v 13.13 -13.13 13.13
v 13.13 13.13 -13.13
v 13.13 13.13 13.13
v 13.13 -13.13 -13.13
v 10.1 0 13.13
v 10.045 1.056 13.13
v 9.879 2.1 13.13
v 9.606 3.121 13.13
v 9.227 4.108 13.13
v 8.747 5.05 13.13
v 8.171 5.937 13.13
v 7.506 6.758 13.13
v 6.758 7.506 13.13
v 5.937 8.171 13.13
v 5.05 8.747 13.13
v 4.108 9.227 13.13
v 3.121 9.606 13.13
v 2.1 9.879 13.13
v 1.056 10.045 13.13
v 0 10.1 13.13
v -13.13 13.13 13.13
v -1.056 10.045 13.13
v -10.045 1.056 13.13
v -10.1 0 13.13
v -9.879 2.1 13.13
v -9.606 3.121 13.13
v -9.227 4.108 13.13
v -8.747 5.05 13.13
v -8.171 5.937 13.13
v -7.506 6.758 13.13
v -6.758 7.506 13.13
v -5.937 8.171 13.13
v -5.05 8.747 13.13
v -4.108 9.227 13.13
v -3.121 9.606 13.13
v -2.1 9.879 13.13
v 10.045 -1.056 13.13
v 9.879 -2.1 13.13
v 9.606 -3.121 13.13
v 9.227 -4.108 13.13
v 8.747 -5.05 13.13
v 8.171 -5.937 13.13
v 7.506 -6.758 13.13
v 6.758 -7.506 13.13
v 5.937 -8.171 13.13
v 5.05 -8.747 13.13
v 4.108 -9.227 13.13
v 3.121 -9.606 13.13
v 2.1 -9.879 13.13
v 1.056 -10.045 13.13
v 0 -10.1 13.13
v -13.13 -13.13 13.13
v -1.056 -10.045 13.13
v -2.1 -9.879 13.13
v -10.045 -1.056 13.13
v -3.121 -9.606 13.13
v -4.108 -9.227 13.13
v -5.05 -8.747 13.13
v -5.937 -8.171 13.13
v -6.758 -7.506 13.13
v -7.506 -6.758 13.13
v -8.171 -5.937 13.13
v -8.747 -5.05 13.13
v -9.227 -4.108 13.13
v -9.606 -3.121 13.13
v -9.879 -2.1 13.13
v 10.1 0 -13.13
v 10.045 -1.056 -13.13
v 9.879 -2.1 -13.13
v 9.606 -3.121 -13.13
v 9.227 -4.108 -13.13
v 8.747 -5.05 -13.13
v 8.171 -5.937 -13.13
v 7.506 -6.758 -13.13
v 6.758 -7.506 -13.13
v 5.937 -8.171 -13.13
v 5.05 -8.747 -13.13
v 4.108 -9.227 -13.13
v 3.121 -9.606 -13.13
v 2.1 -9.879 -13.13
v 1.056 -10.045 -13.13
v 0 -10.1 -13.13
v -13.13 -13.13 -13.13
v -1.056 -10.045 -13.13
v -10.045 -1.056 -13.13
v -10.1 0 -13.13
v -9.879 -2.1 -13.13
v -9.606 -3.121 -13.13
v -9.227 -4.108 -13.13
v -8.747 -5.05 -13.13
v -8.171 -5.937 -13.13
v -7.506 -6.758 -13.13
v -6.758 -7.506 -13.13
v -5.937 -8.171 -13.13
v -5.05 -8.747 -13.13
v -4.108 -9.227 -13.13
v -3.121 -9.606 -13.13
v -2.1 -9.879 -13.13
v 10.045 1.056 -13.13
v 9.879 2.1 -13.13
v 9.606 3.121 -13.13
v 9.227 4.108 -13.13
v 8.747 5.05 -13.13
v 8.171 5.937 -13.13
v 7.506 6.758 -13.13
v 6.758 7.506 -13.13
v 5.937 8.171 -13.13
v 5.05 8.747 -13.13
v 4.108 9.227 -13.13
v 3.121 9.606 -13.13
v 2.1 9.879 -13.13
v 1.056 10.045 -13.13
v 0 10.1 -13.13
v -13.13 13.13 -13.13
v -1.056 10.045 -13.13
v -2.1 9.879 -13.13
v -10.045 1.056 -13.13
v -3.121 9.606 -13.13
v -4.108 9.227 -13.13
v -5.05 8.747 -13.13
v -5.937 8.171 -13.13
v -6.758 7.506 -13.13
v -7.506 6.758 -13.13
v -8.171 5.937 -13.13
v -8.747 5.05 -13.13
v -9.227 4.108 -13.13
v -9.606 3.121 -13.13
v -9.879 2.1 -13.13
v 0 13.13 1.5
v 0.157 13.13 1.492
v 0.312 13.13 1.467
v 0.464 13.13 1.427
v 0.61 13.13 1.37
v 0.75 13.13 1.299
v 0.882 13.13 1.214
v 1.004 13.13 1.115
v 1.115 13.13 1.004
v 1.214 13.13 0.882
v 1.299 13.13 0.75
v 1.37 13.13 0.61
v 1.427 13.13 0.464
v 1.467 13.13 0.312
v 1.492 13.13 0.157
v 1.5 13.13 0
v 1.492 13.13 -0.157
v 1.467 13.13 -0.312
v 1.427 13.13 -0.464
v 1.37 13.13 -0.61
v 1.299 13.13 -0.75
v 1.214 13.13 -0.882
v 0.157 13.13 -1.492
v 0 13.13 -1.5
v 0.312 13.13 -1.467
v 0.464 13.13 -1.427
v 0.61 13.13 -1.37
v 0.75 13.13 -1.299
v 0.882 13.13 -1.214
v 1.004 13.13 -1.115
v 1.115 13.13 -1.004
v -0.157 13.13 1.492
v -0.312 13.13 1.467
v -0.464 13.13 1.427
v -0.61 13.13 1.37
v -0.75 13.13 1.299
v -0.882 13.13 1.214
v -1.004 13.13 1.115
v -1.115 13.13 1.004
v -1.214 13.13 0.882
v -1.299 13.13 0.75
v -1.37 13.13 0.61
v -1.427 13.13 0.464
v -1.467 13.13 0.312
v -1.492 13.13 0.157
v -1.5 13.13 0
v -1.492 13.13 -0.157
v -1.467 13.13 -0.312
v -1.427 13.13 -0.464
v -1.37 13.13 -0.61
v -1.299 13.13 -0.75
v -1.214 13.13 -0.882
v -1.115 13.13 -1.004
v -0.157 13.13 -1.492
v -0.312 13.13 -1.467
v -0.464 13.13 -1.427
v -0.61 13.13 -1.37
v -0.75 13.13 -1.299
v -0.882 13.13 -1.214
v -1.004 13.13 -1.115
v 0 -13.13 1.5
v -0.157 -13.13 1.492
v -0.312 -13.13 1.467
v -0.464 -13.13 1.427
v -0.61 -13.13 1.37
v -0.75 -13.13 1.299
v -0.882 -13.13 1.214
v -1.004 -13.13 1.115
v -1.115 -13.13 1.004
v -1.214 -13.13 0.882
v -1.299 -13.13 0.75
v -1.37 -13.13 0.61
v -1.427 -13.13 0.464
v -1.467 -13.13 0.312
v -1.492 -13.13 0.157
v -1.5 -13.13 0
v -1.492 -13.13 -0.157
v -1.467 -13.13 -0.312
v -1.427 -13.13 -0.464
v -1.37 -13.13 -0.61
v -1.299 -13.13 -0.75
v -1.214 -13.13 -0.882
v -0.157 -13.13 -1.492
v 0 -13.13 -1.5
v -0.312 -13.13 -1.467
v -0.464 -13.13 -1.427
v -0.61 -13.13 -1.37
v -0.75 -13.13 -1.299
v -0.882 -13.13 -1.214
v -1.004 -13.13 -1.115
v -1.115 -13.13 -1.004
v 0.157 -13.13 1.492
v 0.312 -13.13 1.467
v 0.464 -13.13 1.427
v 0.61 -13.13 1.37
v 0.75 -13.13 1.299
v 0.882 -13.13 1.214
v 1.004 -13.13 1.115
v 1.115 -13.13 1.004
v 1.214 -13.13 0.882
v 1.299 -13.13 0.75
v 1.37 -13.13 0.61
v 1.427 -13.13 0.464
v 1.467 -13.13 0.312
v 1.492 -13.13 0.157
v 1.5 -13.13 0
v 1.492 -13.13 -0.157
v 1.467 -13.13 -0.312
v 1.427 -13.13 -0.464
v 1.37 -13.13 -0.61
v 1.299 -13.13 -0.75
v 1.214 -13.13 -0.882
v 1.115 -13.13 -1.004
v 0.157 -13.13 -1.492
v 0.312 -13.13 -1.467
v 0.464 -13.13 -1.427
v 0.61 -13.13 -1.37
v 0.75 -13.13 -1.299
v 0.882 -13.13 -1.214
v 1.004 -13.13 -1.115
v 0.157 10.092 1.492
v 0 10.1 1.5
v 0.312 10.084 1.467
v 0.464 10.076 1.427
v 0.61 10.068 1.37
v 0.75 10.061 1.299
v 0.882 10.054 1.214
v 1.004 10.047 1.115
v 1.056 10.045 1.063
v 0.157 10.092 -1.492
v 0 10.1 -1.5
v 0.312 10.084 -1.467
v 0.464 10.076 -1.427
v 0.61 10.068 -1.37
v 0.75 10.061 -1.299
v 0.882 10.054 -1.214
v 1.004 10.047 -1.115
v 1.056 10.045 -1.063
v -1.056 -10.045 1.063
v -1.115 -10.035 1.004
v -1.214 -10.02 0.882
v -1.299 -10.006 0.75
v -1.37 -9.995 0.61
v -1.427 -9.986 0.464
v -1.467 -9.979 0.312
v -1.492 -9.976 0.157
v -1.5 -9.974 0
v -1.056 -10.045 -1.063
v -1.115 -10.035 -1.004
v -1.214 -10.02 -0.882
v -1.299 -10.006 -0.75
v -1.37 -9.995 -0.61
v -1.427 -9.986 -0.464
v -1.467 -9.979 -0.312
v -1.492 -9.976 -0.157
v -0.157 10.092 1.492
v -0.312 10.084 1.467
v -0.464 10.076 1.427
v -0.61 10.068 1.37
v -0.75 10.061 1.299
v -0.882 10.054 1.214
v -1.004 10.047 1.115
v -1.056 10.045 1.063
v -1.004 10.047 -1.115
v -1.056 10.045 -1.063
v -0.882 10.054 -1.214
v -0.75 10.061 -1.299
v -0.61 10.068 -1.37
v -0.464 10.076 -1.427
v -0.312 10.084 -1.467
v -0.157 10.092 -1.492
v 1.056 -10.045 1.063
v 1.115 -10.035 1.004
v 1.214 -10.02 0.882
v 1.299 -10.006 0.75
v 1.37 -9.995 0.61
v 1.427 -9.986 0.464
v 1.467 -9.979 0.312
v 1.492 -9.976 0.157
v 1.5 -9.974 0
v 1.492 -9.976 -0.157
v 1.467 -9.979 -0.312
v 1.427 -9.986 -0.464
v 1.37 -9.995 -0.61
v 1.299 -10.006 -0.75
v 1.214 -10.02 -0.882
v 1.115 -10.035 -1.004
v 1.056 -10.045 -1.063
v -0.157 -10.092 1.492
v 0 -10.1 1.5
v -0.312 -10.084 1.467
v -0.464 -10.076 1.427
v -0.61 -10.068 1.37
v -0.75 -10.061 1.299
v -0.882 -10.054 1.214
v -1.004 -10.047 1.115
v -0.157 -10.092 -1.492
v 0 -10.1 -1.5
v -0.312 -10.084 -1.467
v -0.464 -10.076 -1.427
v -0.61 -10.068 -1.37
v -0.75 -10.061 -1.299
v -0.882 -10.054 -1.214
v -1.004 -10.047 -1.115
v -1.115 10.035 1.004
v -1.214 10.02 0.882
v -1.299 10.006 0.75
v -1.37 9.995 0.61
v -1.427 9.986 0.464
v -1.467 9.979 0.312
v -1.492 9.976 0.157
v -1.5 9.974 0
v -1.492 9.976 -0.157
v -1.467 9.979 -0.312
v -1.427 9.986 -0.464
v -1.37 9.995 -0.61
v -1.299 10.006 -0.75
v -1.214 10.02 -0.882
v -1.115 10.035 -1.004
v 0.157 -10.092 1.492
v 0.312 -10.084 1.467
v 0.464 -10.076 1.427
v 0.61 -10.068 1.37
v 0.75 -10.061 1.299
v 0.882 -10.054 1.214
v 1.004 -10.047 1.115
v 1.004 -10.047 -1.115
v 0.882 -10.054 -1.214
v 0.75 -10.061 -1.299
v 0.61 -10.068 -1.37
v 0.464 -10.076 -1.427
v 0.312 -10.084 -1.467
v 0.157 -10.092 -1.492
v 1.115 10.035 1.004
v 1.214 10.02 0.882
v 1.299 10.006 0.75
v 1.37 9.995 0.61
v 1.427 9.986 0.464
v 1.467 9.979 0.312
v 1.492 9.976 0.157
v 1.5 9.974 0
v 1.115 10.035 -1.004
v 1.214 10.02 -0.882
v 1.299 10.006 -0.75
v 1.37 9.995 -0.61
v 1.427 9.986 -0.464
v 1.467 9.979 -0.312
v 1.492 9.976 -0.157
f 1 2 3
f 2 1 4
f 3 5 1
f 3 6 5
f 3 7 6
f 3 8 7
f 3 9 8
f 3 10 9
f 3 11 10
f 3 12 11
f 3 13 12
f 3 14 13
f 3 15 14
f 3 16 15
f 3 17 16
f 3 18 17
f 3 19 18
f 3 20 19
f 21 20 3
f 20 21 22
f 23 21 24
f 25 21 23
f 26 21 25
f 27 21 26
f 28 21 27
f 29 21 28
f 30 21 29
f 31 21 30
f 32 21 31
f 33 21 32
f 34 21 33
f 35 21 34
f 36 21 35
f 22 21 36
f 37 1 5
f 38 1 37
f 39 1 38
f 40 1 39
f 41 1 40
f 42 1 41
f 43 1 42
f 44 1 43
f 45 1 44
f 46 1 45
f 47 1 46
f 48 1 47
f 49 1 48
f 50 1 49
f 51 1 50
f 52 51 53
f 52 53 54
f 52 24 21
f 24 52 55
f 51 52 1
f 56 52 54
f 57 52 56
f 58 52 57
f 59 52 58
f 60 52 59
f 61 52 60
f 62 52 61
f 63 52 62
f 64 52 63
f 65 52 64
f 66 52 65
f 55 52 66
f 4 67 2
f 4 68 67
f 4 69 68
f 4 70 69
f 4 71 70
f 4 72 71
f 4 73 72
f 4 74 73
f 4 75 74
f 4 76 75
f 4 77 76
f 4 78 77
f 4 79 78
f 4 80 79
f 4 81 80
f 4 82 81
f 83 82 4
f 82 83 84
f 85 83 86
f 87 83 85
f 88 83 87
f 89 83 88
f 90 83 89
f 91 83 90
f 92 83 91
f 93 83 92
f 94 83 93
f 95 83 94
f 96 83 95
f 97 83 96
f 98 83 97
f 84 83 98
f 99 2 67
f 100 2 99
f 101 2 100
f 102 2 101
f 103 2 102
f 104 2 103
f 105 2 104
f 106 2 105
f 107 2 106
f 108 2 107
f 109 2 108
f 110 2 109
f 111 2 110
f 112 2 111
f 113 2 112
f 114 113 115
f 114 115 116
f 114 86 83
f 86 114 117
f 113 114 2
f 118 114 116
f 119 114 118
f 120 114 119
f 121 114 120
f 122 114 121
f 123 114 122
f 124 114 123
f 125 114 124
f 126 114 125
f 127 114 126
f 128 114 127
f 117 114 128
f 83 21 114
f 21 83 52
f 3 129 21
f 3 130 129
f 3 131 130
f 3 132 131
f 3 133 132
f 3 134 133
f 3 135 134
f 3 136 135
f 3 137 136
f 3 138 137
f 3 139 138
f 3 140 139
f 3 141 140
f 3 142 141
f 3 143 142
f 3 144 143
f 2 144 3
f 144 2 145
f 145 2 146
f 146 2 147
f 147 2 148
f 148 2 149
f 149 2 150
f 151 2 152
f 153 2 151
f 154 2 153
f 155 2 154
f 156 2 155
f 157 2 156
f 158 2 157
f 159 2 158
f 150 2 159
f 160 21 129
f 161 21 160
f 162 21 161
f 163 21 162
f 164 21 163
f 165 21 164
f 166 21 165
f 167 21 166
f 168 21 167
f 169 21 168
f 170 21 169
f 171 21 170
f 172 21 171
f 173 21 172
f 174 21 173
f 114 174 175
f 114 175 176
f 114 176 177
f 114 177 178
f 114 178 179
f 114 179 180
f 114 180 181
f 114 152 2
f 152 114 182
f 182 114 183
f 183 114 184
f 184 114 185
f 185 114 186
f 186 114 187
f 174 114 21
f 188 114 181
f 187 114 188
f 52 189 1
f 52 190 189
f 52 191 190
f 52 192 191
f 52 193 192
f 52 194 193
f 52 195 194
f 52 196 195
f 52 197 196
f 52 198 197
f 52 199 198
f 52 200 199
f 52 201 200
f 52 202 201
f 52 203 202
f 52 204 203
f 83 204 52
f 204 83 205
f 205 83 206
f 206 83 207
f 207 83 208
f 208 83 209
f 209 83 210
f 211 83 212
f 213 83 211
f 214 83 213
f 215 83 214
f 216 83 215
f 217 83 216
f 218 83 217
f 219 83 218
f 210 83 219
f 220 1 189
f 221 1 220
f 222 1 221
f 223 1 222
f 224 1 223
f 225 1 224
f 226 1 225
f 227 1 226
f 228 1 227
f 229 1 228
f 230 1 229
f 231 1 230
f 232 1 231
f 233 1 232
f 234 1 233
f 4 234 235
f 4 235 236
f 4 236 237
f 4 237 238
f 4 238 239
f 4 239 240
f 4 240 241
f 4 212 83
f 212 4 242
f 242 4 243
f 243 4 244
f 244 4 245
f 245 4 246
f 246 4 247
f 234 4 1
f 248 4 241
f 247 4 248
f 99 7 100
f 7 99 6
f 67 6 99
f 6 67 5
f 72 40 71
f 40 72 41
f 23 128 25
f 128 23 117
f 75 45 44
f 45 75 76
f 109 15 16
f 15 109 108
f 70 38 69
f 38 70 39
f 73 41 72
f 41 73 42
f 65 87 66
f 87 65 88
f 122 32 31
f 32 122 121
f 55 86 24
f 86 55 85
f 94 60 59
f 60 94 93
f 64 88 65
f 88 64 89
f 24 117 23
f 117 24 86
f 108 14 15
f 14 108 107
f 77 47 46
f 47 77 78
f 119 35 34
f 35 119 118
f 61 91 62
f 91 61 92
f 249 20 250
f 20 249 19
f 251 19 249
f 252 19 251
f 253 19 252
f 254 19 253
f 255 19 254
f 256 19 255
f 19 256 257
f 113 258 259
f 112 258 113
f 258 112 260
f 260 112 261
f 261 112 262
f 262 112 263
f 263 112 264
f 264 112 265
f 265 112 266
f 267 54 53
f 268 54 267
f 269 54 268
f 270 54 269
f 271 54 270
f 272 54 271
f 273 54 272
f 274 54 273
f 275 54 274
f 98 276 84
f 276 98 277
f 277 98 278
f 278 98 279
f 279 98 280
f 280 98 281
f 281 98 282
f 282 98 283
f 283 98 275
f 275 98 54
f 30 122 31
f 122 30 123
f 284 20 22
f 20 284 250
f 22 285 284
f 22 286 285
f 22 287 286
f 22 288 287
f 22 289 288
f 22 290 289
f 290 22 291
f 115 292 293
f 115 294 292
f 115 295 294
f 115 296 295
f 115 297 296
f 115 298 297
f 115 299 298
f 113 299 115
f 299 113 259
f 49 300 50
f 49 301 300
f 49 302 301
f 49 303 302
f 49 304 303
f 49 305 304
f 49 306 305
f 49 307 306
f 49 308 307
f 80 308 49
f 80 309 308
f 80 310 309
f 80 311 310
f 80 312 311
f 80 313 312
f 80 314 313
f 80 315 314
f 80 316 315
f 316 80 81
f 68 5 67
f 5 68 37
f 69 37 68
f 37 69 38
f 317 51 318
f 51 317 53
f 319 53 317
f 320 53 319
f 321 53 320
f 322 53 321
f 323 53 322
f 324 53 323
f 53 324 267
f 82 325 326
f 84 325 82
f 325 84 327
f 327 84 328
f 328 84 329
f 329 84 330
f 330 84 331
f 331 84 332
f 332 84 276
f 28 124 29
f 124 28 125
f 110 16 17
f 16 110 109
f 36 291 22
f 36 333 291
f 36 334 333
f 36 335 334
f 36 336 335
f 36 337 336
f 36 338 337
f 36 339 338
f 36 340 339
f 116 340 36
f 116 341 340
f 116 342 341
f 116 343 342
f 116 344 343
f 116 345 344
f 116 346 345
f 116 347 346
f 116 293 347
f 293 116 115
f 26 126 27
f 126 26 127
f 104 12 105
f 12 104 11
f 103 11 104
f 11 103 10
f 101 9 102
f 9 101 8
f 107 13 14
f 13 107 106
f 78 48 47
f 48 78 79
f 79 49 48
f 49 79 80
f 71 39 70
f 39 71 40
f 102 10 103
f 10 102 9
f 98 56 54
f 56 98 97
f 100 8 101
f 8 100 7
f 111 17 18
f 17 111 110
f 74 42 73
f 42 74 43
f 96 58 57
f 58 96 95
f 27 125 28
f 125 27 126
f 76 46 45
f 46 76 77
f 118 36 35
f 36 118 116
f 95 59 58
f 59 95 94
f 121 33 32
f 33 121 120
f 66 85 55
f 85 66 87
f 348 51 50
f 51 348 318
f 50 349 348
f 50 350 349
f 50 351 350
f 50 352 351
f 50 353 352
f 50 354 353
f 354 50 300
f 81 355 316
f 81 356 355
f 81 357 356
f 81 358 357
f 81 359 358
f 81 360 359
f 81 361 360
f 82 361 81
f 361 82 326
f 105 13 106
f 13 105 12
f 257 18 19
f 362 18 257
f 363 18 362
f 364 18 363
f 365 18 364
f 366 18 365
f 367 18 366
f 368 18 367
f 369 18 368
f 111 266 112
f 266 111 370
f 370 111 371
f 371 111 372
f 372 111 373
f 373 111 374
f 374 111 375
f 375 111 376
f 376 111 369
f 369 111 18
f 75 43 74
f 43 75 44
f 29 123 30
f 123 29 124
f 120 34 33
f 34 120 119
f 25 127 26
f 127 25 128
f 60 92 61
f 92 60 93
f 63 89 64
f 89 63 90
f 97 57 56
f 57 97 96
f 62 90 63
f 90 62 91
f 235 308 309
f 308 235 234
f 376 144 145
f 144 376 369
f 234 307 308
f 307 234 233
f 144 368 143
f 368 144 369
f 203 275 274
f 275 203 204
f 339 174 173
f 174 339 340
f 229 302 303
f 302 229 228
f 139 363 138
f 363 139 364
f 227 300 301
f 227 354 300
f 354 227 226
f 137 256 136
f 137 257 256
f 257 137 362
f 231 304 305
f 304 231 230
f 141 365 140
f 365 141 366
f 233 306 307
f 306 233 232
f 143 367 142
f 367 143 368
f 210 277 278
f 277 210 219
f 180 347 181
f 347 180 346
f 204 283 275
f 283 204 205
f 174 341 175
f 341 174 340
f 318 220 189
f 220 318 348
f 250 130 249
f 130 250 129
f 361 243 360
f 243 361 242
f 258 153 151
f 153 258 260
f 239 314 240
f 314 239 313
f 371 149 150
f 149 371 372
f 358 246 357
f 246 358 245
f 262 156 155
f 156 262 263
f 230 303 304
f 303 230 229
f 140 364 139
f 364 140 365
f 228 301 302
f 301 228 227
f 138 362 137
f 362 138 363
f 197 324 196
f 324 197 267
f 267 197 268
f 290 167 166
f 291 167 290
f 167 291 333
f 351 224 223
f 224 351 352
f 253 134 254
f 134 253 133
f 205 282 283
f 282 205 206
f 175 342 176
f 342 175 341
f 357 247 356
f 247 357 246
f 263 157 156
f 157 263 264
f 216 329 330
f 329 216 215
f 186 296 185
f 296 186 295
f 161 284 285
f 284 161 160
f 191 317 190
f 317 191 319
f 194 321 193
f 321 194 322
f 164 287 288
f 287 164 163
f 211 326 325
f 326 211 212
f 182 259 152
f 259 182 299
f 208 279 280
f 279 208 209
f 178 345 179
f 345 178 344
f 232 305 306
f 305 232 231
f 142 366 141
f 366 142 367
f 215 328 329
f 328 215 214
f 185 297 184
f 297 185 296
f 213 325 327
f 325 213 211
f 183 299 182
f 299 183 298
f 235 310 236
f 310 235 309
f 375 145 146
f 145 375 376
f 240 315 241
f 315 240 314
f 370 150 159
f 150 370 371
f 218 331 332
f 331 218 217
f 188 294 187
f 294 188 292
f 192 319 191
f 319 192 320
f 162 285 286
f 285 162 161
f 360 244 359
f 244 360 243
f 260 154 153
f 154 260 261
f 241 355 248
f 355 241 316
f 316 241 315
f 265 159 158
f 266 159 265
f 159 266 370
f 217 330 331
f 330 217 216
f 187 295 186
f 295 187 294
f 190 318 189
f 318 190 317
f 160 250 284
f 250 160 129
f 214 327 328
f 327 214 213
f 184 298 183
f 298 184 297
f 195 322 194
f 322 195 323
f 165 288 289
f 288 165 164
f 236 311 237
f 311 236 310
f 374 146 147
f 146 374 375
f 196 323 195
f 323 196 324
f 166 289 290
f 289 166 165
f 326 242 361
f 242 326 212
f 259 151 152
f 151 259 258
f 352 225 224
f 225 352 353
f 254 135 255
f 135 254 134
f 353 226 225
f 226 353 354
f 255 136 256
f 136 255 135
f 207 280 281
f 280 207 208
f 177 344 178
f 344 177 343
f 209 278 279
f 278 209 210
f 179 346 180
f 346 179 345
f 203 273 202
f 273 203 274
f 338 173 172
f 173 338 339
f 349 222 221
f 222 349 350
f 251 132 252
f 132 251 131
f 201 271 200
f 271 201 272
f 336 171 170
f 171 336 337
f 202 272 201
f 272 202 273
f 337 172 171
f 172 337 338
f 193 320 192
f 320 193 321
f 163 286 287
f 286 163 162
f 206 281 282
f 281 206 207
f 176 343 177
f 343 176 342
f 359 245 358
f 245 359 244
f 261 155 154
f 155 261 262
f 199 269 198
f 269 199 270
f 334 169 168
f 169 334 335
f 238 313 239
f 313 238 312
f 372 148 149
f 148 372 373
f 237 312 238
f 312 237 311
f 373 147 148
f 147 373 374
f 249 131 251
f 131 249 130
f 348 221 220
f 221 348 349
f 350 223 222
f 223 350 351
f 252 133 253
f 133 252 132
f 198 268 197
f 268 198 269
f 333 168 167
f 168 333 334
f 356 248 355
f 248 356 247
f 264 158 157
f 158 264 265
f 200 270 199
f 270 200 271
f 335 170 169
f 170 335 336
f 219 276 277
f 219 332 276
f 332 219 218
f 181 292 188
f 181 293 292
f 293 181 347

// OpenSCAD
$fn = 60;
dia = 20.2;
dia_drill = 3;

difference () {
    cube([dia * 1.3, dia * 1.3,dia * 1.3], center = true);
    cylinder(d=dia, h=dia * 1.4, center = true);
    rotate([90, 0, 0]) cylinder(d=dia_drill, h=dia * 1.4, center = true);
}
